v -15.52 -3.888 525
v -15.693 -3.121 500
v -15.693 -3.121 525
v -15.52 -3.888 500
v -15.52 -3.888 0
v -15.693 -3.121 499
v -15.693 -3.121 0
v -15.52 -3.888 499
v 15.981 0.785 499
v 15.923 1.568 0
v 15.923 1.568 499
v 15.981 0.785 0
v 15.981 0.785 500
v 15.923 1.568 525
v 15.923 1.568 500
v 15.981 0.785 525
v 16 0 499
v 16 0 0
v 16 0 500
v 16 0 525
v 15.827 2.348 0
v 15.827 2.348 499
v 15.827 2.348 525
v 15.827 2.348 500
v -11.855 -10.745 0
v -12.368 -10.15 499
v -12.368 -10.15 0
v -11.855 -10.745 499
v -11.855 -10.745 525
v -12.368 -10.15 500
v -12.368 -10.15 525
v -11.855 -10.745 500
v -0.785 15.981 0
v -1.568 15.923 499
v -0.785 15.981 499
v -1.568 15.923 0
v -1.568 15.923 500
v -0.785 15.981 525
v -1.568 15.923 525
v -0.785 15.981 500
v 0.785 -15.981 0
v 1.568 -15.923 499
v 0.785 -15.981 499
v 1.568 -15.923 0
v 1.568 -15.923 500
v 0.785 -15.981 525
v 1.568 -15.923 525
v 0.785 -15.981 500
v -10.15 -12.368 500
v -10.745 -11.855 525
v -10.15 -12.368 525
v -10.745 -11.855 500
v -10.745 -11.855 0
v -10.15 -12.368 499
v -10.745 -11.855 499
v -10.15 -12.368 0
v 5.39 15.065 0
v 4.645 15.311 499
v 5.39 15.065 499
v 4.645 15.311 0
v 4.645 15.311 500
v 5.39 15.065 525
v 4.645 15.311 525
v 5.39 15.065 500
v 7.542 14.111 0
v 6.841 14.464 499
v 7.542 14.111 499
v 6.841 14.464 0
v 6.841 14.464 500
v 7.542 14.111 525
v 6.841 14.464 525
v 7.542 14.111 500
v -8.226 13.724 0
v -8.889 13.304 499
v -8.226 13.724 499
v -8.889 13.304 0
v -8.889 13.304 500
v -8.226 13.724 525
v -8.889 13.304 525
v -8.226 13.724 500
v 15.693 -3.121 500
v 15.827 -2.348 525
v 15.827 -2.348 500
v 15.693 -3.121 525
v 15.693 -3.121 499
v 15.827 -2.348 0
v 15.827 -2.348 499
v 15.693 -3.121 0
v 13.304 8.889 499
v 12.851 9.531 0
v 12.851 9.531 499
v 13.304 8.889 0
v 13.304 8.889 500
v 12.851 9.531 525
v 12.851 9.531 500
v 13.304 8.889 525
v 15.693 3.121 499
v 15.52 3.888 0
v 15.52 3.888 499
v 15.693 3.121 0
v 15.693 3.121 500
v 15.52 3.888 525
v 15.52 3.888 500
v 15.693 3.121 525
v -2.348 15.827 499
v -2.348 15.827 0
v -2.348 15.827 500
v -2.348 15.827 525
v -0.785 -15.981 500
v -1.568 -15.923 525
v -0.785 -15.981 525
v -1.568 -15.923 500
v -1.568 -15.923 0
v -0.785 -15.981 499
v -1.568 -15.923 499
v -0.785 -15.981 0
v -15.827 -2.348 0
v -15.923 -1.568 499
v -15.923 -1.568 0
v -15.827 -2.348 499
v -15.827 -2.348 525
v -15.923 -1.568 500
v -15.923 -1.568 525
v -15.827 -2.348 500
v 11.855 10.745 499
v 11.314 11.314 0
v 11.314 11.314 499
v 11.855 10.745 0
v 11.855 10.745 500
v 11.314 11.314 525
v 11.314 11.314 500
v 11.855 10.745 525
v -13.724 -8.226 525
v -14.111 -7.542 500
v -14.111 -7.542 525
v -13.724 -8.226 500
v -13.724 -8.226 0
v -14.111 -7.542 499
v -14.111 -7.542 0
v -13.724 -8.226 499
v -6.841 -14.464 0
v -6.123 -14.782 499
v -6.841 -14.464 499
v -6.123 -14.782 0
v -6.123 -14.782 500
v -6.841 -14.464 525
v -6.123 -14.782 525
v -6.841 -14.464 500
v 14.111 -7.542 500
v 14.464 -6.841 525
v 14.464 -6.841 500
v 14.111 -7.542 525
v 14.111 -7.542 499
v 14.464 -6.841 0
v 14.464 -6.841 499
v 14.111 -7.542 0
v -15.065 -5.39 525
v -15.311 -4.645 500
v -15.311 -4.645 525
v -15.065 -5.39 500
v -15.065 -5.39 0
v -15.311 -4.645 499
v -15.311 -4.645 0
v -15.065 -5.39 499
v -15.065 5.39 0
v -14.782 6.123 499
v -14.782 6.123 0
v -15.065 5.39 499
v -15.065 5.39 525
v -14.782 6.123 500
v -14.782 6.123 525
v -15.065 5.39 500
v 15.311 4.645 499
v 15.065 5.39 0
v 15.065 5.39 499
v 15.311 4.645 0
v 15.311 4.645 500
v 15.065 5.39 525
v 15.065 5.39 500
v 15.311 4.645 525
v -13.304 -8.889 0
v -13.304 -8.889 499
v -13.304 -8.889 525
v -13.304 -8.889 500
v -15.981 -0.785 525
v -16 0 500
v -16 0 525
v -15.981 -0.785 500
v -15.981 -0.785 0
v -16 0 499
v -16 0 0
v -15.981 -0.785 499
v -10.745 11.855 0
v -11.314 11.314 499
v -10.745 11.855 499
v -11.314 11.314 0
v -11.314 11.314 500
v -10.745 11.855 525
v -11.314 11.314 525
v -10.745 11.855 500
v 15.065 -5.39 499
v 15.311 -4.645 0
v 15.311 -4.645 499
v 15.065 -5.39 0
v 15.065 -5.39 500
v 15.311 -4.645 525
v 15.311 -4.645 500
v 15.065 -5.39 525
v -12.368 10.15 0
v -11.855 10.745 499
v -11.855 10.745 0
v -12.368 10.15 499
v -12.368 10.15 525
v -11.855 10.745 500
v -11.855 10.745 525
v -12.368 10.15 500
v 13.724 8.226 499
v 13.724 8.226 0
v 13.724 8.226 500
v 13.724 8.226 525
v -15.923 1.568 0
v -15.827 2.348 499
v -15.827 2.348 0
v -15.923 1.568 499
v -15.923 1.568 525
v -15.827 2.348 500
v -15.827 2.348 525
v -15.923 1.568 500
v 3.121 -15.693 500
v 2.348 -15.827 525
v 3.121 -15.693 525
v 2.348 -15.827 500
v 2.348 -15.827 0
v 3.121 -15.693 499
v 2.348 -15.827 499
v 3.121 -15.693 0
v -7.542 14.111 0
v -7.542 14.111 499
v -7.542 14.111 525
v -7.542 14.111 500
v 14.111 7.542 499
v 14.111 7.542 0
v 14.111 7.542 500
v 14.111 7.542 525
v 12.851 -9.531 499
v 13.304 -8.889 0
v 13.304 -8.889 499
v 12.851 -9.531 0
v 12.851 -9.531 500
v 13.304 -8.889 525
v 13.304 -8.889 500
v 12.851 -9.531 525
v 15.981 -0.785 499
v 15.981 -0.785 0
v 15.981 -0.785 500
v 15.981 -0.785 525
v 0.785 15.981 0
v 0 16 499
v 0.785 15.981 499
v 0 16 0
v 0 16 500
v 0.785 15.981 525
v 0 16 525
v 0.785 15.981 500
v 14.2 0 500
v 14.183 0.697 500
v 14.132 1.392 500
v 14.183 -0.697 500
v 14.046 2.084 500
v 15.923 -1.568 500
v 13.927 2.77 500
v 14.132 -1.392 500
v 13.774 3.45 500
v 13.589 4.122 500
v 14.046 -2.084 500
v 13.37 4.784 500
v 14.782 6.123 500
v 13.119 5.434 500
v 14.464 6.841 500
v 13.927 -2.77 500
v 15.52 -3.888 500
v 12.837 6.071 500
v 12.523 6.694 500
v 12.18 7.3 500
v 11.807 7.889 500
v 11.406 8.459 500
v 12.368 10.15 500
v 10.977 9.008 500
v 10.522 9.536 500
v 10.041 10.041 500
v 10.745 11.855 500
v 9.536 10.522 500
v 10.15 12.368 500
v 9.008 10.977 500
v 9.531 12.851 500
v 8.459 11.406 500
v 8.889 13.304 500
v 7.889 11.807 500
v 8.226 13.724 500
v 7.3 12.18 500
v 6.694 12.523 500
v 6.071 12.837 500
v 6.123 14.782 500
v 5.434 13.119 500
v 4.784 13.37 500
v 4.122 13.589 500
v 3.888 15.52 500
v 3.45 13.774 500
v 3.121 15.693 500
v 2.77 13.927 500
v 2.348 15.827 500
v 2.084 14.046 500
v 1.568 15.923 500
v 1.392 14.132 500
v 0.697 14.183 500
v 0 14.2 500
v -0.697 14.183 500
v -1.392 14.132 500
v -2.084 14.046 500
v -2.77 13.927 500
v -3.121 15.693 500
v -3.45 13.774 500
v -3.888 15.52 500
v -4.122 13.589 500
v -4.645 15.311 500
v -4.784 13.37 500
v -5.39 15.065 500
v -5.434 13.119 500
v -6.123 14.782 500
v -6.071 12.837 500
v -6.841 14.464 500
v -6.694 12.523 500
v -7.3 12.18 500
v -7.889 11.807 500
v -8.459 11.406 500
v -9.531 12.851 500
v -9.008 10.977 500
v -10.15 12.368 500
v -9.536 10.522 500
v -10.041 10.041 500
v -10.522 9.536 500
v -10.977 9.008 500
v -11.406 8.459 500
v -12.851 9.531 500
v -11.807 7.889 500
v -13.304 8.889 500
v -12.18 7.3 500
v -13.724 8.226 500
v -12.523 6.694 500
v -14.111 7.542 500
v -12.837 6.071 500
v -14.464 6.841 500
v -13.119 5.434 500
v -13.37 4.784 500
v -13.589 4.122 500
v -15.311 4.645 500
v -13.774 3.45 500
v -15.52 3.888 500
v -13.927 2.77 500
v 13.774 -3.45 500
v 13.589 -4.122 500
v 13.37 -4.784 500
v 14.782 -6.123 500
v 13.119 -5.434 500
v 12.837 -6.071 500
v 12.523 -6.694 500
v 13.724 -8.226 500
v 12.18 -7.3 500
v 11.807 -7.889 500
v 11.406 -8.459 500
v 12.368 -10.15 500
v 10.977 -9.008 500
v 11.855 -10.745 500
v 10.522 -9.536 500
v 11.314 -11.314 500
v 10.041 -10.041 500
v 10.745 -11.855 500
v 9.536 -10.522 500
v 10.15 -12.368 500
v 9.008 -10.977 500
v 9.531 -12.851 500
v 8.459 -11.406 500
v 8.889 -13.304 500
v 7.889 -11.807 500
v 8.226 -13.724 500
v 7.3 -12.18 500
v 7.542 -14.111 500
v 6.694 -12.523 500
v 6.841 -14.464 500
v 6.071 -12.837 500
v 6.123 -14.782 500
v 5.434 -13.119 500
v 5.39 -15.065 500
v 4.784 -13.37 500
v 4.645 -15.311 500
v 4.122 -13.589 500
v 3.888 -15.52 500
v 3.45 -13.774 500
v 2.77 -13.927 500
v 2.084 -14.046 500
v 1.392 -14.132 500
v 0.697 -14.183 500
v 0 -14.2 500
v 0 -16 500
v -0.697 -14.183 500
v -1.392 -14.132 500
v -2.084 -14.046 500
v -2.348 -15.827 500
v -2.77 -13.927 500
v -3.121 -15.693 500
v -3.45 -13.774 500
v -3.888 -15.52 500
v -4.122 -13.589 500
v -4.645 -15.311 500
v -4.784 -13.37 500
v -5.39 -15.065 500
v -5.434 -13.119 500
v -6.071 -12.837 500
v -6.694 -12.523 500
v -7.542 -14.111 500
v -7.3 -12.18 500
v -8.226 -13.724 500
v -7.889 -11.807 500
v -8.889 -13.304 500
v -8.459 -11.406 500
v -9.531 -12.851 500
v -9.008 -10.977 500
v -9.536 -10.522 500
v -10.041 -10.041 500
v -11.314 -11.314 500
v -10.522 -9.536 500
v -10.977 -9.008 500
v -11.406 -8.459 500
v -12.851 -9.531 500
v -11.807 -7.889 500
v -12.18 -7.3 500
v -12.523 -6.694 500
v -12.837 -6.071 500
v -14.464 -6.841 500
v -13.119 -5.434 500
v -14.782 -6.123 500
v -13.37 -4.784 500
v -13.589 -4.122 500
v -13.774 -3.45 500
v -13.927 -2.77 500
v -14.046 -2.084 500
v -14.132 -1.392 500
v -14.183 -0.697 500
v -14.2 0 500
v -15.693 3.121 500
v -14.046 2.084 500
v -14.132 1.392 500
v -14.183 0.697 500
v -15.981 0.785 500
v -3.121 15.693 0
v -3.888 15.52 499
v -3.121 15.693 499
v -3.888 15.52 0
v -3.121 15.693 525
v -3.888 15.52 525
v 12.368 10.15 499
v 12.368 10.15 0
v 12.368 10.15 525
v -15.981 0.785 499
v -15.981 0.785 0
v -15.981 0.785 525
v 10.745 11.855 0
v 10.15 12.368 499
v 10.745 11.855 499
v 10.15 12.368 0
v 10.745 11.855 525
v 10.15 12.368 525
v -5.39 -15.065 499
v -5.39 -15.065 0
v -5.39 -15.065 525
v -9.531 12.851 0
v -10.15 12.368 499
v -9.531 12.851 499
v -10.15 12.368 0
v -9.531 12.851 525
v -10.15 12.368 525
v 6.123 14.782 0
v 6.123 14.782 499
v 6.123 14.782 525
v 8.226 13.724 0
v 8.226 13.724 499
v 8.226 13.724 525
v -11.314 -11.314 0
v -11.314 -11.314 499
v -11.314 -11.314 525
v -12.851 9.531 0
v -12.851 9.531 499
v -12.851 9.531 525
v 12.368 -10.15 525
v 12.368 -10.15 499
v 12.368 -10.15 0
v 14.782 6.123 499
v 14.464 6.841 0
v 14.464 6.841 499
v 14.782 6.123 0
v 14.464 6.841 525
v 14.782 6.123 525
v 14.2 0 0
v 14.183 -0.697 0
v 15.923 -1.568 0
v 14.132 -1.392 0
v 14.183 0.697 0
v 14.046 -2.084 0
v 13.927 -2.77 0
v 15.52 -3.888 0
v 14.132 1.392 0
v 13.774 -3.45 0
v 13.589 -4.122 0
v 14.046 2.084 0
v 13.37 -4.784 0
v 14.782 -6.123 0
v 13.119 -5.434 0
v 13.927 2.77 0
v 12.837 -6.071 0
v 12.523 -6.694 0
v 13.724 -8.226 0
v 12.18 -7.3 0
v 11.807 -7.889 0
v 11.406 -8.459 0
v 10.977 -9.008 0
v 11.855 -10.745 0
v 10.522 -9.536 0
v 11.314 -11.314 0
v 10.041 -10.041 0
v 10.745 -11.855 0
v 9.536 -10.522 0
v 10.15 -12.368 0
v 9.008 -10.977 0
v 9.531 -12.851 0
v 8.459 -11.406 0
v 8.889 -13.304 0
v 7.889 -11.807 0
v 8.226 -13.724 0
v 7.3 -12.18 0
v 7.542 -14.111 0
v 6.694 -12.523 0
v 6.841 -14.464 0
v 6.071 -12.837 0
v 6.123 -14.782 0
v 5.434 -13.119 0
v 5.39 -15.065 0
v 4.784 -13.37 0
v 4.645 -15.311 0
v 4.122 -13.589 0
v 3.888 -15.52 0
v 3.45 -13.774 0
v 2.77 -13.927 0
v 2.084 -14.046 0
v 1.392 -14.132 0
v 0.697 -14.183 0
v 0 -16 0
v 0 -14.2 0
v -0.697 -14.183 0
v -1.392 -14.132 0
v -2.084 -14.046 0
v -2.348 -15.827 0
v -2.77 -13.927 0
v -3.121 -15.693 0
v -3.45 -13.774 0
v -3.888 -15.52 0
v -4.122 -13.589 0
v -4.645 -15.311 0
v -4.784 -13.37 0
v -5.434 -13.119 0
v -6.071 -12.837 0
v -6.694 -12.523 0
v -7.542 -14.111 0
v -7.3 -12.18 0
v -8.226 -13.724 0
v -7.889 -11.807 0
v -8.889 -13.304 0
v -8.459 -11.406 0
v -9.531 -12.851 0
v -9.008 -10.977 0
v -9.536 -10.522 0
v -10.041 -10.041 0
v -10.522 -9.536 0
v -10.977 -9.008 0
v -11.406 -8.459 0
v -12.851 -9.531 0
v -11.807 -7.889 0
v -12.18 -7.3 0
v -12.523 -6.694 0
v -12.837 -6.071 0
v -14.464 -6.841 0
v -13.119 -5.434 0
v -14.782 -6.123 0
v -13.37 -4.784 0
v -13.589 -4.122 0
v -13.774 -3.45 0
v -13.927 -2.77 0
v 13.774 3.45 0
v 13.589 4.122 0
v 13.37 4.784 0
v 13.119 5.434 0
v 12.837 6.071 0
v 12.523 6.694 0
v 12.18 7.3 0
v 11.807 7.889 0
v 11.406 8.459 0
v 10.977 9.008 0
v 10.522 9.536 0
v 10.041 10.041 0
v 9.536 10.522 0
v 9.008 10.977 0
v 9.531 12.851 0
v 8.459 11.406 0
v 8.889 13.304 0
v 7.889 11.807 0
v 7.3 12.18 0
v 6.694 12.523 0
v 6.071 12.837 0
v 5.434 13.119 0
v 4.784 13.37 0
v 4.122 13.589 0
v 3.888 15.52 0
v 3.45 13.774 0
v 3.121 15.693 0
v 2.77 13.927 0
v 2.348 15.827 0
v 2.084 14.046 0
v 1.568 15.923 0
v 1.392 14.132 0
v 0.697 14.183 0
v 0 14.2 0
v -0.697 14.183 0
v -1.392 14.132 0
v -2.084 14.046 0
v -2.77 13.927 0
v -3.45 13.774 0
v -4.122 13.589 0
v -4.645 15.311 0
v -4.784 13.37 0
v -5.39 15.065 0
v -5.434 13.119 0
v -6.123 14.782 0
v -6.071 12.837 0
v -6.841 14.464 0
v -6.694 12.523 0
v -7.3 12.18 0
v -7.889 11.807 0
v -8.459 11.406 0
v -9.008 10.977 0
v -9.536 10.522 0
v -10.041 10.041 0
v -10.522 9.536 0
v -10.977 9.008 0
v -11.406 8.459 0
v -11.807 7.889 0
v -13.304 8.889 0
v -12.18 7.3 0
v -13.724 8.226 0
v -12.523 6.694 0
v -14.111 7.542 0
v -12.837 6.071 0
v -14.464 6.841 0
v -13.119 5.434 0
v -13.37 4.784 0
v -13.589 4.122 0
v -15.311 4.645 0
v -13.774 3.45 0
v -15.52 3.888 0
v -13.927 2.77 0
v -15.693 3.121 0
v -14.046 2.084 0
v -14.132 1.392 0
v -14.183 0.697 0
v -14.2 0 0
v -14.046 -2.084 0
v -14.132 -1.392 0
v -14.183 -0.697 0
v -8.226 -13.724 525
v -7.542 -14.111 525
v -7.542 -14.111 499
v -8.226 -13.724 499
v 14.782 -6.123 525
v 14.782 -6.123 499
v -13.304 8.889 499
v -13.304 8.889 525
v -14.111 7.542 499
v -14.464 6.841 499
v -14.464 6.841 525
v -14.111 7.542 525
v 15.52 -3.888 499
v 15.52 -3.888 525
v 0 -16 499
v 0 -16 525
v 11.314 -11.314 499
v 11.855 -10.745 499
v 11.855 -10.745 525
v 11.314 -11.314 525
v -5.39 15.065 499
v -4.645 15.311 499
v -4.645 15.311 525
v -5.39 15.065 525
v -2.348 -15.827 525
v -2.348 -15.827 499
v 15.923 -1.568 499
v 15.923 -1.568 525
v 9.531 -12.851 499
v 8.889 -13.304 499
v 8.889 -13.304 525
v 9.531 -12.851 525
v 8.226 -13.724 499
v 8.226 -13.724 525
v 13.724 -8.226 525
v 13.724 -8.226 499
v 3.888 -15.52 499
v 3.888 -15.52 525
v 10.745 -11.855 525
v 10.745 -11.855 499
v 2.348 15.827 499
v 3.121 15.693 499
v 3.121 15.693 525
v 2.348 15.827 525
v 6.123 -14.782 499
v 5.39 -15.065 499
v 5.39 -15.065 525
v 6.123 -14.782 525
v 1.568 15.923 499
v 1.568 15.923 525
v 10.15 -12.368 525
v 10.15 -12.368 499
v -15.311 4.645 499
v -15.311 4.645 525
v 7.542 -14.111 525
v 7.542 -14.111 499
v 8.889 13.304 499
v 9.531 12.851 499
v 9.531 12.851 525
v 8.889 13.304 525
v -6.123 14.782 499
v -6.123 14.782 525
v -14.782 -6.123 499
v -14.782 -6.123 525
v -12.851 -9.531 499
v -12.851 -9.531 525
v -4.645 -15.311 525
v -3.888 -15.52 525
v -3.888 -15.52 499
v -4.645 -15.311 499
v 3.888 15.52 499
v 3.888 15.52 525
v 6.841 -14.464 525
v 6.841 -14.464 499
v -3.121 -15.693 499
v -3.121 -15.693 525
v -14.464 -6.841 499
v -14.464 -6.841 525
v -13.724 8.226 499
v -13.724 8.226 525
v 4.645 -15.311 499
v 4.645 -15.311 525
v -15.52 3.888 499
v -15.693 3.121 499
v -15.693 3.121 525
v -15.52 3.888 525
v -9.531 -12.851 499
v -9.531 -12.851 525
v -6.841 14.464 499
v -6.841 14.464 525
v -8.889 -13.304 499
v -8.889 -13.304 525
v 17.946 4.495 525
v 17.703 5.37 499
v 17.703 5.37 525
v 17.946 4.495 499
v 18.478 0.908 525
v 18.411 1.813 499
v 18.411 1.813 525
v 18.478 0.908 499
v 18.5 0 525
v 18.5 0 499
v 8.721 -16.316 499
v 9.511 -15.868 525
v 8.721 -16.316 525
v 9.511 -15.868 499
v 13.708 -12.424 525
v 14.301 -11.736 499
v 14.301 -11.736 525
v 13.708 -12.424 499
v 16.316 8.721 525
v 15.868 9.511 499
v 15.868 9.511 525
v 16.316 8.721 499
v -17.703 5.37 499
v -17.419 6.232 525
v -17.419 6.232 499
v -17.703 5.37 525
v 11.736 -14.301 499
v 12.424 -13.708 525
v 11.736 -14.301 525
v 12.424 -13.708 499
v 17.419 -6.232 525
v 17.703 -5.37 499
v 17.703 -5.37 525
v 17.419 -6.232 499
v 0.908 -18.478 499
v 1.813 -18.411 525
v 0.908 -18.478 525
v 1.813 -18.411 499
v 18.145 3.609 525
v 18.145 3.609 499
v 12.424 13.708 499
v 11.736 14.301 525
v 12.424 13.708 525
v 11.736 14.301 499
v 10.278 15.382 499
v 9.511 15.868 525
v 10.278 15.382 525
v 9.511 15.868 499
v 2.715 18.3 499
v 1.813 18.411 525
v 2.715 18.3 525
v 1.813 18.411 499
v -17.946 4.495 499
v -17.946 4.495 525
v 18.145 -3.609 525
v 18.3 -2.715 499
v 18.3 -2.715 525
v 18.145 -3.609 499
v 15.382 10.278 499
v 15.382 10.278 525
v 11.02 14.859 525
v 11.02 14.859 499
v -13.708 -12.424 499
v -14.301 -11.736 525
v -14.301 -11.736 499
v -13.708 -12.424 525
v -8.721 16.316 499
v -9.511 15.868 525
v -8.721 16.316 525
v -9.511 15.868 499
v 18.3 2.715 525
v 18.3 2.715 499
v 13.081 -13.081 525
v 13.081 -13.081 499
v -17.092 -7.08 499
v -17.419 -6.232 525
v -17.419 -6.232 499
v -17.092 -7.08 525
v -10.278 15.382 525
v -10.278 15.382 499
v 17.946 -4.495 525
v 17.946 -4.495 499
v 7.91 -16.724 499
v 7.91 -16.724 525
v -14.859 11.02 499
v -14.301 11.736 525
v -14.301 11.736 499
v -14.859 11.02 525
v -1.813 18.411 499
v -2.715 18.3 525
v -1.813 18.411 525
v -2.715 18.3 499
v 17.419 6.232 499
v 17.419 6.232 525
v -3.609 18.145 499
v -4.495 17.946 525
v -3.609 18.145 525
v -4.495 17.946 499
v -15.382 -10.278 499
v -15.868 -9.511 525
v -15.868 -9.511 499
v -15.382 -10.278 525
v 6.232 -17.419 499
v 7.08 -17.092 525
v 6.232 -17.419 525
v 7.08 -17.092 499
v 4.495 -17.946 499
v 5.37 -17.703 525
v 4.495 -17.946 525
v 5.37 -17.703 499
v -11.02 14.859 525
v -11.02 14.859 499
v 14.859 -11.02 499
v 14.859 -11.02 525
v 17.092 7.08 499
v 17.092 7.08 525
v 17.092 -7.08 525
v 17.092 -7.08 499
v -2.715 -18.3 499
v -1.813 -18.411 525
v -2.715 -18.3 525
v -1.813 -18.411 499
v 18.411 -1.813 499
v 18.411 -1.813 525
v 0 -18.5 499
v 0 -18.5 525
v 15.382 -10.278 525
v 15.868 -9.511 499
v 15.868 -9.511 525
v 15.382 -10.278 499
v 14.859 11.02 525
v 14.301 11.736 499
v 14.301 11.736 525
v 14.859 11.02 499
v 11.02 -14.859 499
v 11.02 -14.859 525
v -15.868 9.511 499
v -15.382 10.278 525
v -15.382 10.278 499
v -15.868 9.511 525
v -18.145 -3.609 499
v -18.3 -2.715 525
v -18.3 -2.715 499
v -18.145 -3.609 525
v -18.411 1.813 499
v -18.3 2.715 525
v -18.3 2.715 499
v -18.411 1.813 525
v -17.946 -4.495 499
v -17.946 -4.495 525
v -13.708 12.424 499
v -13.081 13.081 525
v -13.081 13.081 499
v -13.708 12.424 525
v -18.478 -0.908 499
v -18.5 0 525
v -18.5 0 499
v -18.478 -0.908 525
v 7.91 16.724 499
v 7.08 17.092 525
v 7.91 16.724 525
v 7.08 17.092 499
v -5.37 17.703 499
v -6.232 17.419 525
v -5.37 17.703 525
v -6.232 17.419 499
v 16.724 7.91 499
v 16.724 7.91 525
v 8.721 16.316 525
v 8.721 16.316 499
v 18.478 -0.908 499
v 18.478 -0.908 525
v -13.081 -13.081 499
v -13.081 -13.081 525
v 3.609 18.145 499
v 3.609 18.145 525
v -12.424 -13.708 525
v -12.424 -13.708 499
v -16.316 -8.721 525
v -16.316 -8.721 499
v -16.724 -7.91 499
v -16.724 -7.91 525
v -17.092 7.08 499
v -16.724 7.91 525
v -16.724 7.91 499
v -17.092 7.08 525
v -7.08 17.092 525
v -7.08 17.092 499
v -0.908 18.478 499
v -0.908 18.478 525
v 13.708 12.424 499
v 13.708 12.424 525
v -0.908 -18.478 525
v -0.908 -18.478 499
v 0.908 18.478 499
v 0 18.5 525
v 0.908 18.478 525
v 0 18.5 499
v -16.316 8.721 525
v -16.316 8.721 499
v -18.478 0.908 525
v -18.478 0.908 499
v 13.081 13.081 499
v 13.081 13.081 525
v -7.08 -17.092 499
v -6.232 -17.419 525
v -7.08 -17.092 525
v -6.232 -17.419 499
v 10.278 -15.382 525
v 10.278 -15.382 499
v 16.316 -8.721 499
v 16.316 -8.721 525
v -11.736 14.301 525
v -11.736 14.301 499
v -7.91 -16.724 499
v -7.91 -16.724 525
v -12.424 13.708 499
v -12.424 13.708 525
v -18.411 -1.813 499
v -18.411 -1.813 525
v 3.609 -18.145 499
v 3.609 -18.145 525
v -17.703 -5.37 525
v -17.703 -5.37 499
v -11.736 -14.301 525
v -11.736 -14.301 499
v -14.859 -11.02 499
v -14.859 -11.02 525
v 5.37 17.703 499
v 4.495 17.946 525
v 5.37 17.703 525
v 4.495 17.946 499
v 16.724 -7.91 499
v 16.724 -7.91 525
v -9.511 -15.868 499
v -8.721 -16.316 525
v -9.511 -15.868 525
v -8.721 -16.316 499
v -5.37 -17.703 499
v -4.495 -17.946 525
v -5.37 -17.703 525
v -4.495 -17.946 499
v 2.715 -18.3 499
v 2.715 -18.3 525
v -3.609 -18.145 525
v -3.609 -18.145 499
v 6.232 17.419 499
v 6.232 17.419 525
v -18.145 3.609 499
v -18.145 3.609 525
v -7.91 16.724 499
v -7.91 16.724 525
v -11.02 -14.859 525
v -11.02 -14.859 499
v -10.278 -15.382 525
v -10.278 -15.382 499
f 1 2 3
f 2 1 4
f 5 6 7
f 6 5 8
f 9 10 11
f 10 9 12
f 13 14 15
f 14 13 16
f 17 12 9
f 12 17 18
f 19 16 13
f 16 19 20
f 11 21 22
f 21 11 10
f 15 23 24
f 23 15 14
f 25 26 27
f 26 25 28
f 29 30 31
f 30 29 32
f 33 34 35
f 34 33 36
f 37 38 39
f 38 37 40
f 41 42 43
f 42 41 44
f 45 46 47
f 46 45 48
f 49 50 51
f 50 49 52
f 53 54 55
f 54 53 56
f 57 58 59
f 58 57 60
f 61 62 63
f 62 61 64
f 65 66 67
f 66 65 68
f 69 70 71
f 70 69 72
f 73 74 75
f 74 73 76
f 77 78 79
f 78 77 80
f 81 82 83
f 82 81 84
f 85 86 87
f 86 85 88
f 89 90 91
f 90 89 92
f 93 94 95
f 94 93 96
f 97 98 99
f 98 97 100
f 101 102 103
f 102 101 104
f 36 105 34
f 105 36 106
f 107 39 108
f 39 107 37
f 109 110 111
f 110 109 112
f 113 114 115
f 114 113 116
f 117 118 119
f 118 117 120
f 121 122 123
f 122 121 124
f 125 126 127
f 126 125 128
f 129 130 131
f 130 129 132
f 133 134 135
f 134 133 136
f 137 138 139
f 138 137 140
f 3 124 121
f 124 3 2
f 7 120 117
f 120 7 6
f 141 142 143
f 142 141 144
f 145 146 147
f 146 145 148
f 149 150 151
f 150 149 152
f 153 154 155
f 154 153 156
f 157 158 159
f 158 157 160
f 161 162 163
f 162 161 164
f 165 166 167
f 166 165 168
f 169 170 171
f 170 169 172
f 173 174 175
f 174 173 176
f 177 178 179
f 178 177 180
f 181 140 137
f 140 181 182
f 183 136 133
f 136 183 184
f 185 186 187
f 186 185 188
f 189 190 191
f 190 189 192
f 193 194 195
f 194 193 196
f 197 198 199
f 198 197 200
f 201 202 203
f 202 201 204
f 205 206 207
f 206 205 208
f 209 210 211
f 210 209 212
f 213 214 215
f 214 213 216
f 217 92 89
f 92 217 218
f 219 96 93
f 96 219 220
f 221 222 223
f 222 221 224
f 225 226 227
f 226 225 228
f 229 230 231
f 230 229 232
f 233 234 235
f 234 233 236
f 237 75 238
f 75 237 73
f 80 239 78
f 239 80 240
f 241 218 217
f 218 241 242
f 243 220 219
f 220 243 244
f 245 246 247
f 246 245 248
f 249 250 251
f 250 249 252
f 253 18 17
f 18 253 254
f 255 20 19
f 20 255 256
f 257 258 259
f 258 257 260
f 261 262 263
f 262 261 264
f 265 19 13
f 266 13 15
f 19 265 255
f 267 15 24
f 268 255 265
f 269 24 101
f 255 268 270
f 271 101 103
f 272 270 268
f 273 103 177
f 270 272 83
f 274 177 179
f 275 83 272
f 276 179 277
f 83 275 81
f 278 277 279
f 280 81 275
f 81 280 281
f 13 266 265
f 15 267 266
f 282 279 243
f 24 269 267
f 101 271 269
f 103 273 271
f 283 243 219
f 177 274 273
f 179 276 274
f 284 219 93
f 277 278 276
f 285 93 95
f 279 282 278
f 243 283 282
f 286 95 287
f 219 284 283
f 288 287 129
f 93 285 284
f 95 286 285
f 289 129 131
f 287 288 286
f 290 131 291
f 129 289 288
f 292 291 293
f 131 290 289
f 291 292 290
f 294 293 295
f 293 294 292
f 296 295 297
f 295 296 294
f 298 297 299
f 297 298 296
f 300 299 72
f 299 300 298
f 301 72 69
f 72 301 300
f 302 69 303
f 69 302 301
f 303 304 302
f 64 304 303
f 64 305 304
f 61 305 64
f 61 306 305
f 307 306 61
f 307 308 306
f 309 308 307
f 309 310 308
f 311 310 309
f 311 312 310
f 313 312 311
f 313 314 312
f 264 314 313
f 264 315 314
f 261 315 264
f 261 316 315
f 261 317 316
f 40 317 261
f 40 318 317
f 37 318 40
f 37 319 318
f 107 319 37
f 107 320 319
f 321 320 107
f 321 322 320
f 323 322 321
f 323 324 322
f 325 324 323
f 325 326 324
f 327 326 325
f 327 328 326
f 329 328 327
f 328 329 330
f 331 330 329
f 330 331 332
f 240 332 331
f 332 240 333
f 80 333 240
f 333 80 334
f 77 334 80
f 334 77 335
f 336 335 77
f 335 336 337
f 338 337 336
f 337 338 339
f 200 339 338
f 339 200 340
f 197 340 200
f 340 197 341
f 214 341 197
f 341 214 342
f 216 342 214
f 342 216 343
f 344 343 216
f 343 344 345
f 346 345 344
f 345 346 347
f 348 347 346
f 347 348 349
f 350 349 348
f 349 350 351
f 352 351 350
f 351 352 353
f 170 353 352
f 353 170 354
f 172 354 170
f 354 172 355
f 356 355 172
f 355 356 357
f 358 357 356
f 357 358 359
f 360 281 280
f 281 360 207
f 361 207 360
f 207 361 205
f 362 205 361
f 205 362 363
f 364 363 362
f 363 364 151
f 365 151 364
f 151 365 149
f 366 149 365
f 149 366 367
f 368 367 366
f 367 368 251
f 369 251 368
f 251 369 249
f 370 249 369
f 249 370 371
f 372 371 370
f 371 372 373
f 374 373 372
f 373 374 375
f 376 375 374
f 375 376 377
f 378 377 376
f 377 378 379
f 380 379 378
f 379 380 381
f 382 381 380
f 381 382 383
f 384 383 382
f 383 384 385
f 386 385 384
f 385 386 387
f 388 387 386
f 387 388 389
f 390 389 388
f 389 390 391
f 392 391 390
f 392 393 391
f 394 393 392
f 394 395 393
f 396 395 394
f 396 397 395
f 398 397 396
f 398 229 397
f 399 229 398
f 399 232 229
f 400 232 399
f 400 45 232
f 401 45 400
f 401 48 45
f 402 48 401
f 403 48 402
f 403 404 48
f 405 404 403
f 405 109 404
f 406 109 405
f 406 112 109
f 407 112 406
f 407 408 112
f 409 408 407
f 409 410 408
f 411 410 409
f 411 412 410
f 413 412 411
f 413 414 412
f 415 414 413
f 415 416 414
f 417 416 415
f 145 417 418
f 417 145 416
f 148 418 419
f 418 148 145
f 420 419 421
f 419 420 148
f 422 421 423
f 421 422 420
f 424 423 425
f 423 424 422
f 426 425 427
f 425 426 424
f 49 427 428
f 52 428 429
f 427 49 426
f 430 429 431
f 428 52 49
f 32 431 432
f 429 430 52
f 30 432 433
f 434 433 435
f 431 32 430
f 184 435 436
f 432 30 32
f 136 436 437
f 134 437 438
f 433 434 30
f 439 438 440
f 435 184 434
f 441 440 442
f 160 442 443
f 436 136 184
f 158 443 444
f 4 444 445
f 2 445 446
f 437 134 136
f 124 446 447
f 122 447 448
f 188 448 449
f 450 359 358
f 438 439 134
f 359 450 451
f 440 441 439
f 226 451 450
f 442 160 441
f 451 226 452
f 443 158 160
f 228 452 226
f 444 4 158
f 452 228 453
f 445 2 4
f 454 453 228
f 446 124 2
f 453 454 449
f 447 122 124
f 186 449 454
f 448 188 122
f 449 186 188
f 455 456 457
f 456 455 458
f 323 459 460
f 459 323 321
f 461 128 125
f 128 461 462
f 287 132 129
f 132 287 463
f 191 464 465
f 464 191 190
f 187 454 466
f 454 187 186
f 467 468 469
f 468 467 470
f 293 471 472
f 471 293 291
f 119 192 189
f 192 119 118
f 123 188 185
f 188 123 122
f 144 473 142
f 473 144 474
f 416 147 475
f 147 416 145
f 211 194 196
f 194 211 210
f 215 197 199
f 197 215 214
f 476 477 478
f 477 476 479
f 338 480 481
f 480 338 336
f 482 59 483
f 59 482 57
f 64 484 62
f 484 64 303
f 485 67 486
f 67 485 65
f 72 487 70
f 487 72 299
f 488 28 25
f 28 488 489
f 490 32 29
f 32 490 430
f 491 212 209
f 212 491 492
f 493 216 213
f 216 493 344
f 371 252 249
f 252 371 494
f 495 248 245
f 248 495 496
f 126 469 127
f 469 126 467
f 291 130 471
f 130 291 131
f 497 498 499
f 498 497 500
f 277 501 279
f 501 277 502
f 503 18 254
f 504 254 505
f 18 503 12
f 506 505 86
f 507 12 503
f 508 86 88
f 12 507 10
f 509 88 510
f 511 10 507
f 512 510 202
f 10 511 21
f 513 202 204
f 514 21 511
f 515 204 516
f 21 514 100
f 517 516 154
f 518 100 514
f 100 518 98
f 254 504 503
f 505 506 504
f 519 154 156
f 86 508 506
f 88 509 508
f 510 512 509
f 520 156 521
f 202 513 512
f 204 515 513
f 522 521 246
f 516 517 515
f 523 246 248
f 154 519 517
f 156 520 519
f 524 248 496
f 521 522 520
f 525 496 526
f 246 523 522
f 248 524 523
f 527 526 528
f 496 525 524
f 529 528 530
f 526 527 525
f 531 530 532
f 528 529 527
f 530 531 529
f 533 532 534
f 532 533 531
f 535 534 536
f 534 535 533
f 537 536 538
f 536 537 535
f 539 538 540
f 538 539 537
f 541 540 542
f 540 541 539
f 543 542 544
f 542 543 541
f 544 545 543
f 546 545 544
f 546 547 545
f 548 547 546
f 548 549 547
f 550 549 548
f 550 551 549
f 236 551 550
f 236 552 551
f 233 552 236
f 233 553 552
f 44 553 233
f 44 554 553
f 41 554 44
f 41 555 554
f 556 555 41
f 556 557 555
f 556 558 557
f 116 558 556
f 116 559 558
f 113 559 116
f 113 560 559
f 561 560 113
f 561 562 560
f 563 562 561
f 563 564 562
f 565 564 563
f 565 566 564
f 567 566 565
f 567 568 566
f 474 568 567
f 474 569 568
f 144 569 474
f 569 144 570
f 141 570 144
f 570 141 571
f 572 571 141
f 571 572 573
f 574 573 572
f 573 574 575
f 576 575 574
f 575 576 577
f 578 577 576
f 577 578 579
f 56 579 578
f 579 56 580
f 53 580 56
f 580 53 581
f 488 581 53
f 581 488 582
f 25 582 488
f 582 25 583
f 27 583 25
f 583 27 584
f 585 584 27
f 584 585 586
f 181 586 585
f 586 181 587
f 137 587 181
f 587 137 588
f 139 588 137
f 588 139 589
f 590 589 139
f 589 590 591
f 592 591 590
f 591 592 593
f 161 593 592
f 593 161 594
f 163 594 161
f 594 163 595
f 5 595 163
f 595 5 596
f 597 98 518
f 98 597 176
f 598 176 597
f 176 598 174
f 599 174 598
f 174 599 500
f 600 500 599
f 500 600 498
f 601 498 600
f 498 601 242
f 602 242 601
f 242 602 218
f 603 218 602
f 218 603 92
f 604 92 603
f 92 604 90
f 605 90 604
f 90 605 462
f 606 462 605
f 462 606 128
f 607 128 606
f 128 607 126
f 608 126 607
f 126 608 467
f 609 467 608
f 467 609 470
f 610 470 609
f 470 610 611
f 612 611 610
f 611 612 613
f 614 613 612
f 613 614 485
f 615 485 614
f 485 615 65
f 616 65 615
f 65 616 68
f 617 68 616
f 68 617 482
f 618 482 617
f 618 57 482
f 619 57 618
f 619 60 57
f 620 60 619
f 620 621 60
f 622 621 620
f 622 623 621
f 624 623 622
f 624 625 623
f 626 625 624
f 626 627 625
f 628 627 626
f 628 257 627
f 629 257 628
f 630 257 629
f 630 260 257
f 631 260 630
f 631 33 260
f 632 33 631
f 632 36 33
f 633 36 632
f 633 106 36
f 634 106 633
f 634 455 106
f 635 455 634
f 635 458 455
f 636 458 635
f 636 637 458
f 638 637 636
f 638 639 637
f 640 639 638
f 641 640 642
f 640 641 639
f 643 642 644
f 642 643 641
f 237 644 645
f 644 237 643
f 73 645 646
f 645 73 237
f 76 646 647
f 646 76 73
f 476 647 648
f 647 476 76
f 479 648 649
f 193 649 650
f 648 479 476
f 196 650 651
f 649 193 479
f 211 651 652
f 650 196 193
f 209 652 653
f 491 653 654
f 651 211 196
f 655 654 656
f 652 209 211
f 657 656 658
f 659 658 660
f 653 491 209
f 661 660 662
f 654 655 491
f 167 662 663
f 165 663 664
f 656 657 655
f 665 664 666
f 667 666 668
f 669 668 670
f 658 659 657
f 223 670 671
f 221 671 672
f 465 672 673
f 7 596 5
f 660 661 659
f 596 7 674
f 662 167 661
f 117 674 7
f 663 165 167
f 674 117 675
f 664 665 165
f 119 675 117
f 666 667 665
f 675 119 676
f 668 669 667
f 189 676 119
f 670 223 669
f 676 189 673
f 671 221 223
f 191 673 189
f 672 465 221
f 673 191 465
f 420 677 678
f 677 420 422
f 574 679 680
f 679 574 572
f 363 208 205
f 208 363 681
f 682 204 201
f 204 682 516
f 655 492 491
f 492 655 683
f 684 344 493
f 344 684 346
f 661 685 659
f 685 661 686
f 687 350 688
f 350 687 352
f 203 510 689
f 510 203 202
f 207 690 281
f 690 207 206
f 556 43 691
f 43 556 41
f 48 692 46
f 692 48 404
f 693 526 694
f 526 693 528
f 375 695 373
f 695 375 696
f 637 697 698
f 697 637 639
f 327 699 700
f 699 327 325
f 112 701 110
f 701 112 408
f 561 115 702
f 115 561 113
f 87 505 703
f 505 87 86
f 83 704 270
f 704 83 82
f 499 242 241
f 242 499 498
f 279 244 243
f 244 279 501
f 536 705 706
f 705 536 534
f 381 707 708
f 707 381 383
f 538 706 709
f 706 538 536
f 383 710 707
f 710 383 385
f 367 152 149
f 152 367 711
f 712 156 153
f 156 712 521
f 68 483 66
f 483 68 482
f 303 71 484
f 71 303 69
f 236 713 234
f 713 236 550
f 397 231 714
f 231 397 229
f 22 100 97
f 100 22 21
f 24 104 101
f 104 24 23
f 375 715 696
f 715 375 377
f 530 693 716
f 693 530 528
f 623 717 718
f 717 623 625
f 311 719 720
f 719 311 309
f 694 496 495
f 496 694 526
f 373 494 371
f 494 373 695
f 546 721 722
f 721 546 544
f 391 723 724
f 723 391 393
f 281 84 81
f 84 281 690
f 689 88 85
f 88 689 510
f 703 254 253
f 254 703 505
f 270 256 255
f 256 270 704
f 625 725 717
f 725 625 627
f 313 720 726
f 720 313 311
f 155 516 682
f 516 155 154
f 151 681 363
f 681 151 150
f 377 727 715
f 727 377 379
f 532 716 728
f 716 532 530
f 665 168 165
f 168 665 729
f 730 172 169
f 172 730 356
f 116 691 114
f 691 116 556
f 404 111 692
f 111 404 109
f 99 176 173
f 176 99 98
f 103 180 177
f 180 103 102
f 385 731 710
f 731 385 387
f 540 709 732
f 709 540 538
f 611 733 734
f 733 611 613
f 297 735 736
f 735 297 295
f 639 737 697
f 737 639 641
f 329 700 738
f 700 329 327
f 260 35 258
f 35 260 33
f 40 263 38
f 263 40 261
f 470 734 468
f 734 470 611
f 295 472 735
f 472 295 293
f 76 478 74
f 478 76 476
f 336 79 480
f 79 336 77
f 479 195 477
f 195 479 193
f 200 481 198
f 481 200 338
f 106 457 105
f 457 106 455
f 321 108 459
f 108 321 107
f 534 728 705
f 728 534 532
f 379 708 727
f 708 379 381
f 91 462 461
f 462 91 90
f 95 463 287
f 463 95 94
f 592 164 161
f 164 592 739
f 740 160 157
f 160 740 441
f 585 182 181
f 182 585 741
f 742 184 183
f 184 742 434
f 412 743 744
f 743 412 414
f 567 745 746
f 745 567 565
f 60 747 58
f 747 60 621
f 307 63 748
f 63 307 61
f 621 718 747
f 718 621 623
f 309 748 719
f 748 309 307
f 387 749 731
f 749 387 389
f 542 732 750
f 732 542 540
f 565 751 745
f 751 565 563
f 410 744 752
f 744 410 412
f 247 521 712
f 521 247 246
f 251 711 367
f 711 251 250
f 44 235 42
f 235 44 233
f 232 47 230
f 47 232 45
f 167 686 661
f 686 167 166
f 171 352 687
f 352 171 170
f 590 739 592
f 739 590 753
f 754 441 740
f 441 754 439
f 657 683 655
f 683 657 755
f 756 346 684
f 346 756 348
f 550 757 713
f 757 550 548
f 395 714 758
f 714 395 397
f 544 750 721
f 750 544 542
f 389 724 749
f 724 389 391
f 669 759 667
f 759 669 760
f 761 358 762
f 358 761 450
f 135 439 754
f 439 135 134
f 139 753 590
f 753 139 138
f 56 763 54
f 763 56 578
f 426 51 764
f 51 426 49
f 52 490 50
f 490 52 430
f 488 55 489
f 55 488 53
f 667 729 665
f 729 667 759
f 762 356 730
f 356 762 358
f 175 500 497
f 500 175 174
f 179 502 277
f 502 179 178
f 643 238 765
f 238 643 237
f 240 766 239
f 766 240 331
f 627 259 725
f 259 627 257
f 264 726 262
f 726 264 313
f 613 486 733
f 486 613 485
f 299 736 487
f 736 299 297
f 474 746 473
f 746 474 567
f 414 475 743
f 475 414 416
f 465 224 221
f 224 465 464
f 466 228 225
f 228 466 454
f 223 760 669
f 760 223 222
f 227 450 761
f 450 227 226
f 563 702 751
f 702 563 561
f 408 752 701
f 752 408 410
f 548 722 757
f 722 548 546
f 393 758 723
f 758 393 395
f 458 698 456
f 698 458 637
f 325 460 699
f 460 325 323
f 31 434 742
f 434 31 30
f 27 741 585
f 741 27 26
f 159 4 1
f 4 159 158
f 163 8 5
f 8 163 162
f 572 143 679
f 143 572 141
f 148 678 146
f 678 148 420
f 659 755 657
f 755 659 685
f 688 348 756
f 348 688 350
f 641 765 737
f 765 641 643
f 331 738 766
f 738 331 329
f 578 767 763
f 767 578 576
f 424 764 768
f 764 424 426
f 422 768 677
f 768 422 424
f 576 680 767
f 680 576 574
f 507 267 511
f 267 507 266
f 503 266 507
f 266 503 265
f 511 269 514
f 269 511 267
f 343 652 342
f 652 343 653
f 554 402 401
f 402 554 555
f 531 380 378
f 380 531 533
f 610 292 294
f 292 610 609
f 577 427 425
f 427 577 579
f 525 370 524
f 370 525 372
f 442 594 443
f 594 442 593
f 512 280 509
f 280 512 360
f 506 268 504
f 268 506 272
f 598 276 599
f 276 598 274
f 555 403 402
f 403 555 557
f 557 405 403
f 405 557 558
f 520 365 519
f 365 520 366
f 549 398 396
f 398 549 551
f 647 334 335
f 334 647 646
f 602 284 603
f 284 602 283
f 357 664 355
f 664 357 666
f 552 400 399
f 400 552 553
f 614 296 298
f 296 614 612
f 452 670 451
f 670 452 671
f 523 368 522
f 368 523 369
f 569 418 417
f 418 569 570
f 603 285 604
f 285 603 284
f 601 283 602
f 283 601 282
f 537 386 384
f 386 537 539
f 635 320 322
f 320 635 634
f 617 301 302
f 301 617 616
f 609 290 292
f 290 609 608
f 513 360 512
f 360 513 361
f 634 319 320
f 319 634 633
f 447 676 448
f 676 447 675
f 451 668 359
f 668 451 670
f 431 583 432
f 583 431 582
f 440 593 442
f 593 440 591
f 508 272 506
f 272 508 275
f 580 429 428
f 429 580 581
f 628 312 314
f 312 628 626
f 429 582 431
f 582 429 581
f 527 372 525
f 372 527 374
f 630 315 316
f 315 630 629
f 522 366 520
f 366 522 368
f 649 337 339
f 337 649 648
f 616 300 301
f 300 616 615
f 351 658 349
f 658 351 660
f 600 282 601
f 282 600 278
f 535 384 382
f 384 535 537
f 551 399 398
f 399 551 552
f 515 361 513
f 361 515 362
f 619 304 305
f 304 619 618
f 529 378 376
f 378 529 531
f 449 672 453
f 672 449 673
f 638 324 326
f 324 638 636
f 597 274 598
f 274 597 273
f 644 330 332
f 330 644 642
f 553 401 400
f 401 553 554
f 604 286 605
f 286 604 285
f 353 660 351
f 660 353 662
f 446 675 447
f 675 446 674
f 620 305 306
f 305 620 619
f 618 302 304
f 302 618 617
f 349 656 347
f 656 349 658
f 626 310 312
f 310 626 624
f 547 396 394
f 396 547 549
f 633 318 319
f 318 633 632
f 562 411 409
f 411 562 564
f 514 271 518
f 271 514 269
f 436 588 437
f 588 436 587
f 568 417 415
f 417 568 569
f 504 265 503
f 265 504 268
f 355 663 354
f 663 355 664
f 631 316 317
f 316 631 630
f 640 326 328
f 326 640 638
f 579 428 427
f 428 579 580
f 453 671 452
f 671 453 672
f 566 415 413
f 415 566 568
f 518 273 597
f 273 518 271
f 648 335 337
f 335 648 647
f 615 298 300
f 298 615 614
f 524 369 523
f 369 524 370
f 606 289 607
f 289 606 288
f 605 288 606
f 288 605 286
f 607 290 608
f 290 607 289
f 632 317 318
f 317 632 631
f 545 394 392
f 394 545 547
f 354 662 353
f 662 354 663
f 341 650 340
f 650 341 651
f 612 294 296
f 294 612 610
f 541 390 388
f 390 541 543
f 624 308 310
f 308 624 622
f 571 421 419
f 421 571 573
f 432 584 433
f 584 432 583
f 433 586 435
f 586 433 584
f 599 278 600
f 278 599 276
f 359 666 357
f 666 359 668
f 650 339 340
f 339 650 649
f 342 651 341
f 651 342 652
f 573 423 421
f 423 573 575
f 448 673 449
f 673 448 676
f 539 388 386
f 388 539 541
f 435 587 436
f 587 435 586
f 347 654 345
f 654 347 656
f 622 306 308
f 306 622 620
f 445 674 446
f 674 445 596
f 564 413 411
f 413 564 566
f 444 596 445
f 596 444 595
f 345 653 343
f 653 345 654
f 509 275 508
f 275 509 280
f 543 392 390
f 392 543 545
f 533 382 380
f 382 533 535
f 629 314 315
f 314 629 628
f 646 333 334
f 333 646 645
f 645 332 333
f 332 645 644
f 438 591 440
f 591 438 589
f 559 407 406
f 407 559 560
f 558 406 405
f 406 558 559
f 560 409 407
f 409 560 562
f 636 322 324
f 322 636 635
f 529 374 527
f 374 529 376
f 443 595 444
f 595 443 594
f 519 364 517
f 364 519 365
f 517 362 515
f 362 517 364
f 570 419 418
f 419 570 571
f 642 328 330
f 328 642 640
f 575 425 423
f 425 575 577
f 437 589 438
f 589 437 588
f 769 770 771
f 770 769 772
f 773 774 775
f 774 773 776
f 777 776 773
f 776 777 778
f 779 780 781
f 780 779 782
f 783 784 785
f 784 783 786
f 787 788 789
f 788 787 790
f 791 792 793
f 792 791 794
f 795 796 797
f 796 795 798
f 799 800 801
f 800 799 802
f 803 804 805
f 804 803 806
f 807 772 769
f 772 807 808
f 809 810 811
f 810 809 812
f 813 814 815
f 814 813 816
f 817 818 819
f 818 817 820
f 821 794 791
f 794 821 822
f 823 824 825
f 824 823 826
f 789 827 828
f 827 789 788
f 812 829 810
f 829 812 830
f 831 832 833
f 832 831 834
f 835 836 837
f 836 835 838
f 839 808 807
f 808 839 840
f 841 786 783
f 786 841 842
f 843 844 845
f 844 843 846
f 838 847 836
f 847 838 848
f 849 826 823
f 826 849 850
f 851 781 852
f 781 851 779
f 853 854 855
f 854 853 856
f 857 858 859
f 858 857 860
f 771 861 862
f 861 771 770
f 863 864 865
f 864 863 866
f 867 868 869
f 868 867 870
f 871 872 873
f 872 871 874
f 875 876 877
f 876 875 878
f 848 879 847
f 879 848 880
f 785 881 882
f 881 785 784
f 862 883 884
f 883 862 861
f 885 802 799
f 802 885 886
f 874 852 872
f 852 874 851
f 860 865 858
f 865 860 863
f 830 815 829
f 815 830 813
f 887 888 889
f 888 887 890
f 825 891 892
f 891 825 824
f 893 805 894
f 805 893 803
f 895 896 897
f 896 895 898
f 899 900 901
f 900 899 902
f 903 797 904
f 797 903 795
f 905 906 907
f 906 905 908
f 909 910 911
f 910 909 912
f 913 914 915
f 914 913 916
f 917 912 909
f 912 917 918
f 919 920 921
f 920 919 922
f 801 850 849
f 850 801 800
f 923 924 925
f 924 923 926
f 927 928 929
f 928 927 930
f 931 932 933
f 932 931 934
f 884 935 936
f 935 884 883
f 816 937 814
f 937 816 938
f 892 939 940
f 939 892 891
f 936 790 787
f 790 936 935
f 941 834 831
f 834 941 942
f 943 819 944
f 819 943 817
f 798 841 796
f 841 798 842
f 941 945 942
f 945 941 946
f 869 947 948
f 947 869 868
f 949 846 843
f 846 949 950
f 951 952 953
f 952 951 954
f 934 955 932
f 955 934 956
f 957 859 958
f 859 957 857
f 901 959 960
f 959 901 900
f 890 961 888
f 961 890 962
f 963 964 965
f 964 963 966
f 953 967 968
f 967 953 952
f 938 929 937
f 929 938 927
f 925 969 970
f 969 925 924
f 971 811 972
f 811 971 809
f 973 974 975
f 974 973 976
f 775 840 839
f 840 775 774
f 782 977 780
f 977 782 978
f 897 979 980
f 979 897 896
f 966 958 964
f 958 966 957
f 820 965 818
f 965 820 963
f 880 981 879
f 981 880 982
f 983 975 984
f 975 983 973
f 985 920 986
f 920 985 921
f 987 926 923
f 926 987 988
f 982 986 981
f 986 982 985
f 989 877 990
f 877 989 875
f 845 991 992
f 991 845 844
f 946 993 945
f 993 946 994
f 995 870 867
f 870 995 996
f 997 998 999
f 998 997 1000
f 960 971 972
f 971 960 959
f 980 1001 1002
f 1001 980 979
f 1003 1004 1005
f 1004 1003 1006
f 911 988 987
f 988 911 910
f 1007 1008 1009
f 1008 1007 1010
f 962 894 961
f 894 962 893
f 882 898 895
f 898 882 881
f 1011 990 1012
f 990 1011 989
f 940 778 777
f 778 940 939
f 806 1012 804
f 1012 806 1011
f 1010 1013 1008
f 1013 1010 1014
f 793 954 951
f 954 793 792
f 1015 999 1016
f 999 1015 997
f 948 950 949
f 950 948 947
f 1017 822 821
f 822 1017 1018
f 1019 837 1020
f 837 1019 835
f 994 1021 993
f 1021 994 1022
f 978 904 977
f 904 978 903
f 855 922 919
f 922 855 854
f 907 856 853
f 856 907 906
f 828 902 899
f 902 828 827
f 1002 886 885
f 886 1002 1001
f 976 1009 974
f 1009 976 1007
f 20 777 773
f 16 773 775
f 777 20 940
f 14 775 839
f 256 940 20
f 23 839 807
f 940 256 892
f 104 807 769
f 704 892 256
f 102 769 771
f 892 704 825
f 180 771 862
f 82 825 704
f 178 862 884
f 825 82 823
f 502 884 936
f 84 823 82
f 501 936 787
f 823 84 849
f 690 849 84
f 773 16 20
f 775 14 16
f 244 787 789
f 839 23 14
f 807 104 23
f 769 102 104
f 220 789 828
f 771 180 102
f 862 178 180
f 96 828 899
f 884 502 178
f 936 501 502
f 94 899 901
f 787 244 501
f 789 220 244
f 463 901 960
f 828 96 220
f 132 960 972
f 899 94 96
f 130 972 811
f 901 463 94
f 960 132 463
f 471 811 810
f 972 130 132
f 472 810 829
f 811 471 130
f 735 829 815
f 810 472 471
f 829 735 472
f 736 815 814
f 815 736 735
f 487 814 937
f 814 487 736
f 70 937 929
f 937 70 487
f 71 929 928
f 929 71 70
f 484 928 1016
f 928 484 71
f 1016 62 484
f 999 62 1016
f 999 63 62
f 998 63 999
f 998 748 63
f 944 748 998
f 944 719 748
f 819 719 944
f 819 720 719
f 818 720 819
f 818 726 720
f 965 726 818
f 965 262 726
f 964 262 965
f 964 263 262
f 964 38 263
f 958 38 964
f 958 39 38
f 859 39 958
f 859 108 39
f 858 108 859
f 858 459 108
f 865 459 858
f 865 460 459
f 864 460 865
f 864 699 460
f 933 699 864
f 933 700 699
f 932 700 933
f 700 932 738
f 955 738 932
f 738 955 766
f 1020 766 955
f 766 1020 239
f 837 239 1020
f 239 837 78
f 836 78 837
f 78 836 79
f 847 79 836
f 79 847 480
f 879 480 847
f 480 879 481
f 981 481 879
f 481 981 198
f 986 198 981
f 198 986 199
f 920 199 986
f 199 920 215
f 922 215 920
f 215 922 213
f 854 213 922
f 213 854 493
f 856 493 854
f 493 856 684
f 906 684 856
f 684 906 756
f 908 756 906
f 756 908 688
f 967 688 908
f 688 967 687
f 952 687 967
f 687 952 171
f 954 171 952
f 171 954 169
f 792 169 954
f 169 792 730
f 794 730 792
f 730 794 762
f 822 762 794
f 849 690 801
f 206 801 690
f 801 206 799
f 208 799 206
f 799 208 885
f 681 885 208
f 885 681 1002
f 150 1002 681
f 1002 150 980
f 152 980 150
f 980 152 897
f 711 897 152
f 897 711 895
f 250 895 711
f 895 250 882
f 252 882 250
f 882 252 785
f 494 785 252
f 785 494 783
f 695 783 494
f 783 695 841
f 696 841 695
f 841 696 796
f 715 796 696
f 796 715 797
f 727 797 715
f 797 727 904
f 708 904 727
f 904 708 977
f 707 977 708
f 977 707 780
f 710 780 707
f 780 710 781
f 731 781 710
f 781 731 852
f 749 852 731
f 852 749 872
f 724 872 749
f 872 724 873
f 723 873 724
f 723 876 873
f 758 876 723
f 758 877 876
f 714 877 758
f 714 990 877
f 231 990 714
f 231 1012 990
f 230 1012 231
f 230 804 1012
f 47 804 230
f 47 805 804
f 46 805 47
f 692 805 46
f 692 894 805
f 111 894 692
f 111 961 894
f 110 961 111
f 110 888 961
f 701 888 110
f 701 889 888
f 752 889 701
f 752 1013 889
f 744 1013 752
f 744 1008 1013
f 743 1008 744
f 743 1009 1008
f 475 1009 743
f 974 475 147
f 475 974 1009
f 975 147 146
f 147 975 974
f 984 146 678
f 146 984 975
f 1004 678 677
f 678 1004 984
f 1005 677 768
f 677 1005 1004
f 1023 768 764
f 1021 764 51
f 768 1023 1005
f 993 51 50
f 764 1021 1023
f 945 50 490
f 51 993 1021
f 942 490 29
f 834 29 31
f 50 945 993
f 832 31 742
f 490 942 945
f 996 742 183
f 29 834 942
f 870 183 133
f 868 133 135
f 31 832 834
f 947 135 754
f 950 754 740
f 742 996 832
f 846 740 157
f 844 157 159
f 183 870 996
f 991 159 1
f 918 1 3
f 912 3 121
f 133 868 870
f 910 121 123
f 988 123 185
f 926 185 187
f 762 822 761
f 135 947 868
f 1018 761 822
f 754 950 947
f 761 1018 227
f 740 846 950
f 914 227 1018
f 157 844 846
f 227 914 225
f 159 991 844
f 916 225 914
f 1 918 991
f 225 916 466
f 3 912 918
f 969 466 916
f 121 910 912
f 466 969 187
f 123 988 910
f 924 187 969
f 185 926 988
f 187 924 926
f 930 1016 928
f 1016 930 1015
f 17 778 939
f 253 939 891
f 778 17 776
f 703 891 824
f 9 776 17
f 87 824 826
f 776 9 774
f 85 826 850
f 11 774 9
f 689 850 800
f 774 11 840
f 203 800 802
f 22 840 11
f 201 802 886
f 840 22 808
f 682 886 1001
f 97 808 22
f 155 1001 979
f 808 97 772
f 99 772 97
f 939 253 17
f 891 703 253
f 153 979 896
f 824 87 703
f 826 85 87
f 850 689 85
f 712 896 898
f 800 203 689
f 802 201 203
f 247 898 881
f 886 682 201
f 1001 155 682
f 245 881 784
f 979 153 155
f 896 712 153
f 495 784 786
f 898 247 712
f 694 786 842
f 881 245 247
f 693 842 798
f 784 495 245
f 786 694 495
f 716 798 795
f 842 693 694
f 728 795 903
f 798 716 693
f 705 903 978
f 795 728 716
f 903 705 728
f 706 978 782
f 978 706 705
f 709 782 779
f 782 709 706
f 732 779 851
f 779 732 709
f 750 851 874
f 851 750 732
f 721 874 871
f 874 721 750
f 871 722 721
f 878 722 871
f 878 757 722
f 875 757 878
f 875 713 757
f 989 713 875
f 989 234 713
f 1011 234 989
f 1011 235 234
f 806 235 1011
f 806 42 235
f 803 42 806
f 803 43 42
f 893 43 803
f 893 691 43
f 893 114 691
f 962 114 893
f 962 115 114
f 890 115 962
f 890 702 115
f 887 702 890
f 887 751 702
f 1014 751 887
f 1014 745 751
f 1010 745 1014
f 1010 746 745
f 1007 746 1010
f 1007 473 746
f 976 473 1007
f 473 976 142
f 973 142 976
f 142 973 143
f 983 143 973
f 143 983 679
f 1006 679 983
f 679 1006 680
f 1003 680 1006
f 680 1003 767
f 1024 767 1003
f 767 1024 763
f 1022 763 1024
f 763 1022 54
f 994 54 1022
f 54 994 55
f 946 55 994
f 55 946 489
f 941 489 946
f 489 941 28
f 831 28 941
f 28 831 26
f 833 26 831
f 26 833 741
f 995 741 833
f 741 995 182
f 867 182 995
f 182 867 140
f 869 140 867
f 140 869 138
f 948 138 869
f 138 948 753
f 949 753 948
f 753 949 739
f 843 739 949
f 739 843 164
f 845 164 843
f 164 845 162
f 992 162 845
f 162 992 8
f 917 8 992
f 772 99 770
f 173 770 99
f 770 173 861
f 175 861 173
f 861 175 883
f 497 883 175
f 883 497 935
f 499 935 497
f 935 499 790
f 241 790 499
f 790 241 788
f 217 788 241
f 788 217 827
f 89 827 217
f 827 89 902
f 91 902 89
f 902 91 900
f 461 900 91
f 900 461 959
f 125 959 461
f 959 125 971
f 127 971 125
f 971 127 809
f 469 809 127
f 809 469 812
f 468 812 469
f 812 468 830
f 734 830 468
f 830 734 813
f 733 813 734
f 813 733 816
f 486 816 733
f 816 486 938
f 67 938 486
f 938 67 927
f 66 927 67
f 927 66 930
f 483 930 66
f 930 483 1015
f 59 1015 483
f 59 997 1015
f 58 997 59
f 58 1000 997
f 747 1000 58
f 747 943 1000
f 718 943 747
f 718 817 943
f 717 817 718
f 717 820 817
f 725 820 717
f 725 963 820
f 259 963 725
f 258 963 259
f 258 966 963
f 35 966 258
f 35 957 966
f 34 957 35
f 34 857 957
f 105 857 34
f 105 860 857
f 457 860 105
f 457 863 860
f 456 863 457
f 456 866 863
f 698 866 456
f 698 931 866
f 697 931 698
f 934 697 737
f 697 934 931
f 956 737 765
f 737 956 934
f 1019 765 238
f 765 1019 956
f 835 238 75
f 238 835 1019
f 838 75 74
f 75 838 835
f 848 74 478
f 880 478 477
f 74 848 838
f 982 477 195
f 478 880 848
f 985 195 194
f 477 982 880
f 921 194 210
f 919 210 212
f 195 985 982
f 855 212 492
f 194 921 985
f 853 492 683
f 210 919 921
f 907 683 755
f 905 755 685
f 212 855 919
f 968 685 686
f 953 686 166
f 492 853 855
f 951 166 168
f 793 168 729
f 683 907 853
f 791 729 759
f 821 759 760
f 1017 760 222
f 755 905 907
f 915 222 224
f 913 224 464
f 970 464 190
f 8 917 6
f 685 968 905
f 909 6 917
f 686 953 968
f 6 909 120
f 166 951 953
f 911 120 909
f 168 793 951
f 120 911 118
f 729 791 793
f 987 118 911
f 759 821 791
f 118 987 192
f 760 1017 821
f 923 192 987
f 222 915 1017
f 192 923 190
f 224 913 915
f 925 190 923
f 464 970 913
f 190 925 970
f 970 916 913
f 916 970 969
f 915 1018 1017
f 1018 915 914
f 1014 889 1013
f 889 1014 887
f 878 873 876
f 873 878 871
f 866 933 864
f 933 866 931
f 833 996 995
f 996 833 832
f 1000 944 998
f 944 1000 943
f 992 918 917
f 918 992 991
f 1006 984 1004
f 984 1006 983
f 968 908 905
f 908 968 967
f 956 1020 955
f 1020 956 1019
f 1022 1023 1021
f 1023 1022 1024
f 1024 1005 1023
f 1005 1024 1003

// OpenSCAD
// Parameters
length_mm = 500; //[250:1000:1]
ht32_outer_diameter_mm = 32; //[16:64:0.5]
ht32_wall_thickness_mm = 1.8; //[0.9:3.6:0.1]
include_end_fitting = 1; //[0:1:1]
fitting_length_mm = 25; //[10:60:1]
fitting_radial_thickness_mm = 2.5; //[1:6:0.1]
overlap_mm = 1; //[0.5:2:0.1]

$fn = 128;

// HT Pipe - complete geometry (one connected solid)
module ht_pipe() {
  outer_r = ht32_outer_diameter_mm/2;
  inner_r = max(0.01, outer_r - ht32_wall_thickness_mm);

  fit_outer_r = outer_r + fitting_radial_thickness_mm;
  fit_inner_r = outer_r; // socket ID matches pipe OD

  // Ensure overlap is sane
  ov = min(overlap_mm, min(length_mm, fitting_length_mm)/2);

  color([0.85, 0.85, 0.8])  // PVC color
  union() {
    // Main pipe (hollow)
    difference() {
      cylinder(h=length_mm, r=outer_r, center=false);
      translate([0, 0, -ov])
        cylinder(h=length_mm + 2*ov, r=inner_r, center=false);
    }

    // End fitting (socket) connected to pipe with calculated overlap
    if (include_end_fitting) {
      translate([0, 0, length_mm - ov])  // overlaps into pipe by ov
      difference() {
        cylinder(h=fitting_length_mm + ov, r=fit_outer_r, center=false);
        translate([0, 0, -ov])
          cylinder(h=fitting_length_mm + 2*ov, r=fit_inner_r, center=false);
      }
    }
  }
}

// Assembly
ht_pipe();
